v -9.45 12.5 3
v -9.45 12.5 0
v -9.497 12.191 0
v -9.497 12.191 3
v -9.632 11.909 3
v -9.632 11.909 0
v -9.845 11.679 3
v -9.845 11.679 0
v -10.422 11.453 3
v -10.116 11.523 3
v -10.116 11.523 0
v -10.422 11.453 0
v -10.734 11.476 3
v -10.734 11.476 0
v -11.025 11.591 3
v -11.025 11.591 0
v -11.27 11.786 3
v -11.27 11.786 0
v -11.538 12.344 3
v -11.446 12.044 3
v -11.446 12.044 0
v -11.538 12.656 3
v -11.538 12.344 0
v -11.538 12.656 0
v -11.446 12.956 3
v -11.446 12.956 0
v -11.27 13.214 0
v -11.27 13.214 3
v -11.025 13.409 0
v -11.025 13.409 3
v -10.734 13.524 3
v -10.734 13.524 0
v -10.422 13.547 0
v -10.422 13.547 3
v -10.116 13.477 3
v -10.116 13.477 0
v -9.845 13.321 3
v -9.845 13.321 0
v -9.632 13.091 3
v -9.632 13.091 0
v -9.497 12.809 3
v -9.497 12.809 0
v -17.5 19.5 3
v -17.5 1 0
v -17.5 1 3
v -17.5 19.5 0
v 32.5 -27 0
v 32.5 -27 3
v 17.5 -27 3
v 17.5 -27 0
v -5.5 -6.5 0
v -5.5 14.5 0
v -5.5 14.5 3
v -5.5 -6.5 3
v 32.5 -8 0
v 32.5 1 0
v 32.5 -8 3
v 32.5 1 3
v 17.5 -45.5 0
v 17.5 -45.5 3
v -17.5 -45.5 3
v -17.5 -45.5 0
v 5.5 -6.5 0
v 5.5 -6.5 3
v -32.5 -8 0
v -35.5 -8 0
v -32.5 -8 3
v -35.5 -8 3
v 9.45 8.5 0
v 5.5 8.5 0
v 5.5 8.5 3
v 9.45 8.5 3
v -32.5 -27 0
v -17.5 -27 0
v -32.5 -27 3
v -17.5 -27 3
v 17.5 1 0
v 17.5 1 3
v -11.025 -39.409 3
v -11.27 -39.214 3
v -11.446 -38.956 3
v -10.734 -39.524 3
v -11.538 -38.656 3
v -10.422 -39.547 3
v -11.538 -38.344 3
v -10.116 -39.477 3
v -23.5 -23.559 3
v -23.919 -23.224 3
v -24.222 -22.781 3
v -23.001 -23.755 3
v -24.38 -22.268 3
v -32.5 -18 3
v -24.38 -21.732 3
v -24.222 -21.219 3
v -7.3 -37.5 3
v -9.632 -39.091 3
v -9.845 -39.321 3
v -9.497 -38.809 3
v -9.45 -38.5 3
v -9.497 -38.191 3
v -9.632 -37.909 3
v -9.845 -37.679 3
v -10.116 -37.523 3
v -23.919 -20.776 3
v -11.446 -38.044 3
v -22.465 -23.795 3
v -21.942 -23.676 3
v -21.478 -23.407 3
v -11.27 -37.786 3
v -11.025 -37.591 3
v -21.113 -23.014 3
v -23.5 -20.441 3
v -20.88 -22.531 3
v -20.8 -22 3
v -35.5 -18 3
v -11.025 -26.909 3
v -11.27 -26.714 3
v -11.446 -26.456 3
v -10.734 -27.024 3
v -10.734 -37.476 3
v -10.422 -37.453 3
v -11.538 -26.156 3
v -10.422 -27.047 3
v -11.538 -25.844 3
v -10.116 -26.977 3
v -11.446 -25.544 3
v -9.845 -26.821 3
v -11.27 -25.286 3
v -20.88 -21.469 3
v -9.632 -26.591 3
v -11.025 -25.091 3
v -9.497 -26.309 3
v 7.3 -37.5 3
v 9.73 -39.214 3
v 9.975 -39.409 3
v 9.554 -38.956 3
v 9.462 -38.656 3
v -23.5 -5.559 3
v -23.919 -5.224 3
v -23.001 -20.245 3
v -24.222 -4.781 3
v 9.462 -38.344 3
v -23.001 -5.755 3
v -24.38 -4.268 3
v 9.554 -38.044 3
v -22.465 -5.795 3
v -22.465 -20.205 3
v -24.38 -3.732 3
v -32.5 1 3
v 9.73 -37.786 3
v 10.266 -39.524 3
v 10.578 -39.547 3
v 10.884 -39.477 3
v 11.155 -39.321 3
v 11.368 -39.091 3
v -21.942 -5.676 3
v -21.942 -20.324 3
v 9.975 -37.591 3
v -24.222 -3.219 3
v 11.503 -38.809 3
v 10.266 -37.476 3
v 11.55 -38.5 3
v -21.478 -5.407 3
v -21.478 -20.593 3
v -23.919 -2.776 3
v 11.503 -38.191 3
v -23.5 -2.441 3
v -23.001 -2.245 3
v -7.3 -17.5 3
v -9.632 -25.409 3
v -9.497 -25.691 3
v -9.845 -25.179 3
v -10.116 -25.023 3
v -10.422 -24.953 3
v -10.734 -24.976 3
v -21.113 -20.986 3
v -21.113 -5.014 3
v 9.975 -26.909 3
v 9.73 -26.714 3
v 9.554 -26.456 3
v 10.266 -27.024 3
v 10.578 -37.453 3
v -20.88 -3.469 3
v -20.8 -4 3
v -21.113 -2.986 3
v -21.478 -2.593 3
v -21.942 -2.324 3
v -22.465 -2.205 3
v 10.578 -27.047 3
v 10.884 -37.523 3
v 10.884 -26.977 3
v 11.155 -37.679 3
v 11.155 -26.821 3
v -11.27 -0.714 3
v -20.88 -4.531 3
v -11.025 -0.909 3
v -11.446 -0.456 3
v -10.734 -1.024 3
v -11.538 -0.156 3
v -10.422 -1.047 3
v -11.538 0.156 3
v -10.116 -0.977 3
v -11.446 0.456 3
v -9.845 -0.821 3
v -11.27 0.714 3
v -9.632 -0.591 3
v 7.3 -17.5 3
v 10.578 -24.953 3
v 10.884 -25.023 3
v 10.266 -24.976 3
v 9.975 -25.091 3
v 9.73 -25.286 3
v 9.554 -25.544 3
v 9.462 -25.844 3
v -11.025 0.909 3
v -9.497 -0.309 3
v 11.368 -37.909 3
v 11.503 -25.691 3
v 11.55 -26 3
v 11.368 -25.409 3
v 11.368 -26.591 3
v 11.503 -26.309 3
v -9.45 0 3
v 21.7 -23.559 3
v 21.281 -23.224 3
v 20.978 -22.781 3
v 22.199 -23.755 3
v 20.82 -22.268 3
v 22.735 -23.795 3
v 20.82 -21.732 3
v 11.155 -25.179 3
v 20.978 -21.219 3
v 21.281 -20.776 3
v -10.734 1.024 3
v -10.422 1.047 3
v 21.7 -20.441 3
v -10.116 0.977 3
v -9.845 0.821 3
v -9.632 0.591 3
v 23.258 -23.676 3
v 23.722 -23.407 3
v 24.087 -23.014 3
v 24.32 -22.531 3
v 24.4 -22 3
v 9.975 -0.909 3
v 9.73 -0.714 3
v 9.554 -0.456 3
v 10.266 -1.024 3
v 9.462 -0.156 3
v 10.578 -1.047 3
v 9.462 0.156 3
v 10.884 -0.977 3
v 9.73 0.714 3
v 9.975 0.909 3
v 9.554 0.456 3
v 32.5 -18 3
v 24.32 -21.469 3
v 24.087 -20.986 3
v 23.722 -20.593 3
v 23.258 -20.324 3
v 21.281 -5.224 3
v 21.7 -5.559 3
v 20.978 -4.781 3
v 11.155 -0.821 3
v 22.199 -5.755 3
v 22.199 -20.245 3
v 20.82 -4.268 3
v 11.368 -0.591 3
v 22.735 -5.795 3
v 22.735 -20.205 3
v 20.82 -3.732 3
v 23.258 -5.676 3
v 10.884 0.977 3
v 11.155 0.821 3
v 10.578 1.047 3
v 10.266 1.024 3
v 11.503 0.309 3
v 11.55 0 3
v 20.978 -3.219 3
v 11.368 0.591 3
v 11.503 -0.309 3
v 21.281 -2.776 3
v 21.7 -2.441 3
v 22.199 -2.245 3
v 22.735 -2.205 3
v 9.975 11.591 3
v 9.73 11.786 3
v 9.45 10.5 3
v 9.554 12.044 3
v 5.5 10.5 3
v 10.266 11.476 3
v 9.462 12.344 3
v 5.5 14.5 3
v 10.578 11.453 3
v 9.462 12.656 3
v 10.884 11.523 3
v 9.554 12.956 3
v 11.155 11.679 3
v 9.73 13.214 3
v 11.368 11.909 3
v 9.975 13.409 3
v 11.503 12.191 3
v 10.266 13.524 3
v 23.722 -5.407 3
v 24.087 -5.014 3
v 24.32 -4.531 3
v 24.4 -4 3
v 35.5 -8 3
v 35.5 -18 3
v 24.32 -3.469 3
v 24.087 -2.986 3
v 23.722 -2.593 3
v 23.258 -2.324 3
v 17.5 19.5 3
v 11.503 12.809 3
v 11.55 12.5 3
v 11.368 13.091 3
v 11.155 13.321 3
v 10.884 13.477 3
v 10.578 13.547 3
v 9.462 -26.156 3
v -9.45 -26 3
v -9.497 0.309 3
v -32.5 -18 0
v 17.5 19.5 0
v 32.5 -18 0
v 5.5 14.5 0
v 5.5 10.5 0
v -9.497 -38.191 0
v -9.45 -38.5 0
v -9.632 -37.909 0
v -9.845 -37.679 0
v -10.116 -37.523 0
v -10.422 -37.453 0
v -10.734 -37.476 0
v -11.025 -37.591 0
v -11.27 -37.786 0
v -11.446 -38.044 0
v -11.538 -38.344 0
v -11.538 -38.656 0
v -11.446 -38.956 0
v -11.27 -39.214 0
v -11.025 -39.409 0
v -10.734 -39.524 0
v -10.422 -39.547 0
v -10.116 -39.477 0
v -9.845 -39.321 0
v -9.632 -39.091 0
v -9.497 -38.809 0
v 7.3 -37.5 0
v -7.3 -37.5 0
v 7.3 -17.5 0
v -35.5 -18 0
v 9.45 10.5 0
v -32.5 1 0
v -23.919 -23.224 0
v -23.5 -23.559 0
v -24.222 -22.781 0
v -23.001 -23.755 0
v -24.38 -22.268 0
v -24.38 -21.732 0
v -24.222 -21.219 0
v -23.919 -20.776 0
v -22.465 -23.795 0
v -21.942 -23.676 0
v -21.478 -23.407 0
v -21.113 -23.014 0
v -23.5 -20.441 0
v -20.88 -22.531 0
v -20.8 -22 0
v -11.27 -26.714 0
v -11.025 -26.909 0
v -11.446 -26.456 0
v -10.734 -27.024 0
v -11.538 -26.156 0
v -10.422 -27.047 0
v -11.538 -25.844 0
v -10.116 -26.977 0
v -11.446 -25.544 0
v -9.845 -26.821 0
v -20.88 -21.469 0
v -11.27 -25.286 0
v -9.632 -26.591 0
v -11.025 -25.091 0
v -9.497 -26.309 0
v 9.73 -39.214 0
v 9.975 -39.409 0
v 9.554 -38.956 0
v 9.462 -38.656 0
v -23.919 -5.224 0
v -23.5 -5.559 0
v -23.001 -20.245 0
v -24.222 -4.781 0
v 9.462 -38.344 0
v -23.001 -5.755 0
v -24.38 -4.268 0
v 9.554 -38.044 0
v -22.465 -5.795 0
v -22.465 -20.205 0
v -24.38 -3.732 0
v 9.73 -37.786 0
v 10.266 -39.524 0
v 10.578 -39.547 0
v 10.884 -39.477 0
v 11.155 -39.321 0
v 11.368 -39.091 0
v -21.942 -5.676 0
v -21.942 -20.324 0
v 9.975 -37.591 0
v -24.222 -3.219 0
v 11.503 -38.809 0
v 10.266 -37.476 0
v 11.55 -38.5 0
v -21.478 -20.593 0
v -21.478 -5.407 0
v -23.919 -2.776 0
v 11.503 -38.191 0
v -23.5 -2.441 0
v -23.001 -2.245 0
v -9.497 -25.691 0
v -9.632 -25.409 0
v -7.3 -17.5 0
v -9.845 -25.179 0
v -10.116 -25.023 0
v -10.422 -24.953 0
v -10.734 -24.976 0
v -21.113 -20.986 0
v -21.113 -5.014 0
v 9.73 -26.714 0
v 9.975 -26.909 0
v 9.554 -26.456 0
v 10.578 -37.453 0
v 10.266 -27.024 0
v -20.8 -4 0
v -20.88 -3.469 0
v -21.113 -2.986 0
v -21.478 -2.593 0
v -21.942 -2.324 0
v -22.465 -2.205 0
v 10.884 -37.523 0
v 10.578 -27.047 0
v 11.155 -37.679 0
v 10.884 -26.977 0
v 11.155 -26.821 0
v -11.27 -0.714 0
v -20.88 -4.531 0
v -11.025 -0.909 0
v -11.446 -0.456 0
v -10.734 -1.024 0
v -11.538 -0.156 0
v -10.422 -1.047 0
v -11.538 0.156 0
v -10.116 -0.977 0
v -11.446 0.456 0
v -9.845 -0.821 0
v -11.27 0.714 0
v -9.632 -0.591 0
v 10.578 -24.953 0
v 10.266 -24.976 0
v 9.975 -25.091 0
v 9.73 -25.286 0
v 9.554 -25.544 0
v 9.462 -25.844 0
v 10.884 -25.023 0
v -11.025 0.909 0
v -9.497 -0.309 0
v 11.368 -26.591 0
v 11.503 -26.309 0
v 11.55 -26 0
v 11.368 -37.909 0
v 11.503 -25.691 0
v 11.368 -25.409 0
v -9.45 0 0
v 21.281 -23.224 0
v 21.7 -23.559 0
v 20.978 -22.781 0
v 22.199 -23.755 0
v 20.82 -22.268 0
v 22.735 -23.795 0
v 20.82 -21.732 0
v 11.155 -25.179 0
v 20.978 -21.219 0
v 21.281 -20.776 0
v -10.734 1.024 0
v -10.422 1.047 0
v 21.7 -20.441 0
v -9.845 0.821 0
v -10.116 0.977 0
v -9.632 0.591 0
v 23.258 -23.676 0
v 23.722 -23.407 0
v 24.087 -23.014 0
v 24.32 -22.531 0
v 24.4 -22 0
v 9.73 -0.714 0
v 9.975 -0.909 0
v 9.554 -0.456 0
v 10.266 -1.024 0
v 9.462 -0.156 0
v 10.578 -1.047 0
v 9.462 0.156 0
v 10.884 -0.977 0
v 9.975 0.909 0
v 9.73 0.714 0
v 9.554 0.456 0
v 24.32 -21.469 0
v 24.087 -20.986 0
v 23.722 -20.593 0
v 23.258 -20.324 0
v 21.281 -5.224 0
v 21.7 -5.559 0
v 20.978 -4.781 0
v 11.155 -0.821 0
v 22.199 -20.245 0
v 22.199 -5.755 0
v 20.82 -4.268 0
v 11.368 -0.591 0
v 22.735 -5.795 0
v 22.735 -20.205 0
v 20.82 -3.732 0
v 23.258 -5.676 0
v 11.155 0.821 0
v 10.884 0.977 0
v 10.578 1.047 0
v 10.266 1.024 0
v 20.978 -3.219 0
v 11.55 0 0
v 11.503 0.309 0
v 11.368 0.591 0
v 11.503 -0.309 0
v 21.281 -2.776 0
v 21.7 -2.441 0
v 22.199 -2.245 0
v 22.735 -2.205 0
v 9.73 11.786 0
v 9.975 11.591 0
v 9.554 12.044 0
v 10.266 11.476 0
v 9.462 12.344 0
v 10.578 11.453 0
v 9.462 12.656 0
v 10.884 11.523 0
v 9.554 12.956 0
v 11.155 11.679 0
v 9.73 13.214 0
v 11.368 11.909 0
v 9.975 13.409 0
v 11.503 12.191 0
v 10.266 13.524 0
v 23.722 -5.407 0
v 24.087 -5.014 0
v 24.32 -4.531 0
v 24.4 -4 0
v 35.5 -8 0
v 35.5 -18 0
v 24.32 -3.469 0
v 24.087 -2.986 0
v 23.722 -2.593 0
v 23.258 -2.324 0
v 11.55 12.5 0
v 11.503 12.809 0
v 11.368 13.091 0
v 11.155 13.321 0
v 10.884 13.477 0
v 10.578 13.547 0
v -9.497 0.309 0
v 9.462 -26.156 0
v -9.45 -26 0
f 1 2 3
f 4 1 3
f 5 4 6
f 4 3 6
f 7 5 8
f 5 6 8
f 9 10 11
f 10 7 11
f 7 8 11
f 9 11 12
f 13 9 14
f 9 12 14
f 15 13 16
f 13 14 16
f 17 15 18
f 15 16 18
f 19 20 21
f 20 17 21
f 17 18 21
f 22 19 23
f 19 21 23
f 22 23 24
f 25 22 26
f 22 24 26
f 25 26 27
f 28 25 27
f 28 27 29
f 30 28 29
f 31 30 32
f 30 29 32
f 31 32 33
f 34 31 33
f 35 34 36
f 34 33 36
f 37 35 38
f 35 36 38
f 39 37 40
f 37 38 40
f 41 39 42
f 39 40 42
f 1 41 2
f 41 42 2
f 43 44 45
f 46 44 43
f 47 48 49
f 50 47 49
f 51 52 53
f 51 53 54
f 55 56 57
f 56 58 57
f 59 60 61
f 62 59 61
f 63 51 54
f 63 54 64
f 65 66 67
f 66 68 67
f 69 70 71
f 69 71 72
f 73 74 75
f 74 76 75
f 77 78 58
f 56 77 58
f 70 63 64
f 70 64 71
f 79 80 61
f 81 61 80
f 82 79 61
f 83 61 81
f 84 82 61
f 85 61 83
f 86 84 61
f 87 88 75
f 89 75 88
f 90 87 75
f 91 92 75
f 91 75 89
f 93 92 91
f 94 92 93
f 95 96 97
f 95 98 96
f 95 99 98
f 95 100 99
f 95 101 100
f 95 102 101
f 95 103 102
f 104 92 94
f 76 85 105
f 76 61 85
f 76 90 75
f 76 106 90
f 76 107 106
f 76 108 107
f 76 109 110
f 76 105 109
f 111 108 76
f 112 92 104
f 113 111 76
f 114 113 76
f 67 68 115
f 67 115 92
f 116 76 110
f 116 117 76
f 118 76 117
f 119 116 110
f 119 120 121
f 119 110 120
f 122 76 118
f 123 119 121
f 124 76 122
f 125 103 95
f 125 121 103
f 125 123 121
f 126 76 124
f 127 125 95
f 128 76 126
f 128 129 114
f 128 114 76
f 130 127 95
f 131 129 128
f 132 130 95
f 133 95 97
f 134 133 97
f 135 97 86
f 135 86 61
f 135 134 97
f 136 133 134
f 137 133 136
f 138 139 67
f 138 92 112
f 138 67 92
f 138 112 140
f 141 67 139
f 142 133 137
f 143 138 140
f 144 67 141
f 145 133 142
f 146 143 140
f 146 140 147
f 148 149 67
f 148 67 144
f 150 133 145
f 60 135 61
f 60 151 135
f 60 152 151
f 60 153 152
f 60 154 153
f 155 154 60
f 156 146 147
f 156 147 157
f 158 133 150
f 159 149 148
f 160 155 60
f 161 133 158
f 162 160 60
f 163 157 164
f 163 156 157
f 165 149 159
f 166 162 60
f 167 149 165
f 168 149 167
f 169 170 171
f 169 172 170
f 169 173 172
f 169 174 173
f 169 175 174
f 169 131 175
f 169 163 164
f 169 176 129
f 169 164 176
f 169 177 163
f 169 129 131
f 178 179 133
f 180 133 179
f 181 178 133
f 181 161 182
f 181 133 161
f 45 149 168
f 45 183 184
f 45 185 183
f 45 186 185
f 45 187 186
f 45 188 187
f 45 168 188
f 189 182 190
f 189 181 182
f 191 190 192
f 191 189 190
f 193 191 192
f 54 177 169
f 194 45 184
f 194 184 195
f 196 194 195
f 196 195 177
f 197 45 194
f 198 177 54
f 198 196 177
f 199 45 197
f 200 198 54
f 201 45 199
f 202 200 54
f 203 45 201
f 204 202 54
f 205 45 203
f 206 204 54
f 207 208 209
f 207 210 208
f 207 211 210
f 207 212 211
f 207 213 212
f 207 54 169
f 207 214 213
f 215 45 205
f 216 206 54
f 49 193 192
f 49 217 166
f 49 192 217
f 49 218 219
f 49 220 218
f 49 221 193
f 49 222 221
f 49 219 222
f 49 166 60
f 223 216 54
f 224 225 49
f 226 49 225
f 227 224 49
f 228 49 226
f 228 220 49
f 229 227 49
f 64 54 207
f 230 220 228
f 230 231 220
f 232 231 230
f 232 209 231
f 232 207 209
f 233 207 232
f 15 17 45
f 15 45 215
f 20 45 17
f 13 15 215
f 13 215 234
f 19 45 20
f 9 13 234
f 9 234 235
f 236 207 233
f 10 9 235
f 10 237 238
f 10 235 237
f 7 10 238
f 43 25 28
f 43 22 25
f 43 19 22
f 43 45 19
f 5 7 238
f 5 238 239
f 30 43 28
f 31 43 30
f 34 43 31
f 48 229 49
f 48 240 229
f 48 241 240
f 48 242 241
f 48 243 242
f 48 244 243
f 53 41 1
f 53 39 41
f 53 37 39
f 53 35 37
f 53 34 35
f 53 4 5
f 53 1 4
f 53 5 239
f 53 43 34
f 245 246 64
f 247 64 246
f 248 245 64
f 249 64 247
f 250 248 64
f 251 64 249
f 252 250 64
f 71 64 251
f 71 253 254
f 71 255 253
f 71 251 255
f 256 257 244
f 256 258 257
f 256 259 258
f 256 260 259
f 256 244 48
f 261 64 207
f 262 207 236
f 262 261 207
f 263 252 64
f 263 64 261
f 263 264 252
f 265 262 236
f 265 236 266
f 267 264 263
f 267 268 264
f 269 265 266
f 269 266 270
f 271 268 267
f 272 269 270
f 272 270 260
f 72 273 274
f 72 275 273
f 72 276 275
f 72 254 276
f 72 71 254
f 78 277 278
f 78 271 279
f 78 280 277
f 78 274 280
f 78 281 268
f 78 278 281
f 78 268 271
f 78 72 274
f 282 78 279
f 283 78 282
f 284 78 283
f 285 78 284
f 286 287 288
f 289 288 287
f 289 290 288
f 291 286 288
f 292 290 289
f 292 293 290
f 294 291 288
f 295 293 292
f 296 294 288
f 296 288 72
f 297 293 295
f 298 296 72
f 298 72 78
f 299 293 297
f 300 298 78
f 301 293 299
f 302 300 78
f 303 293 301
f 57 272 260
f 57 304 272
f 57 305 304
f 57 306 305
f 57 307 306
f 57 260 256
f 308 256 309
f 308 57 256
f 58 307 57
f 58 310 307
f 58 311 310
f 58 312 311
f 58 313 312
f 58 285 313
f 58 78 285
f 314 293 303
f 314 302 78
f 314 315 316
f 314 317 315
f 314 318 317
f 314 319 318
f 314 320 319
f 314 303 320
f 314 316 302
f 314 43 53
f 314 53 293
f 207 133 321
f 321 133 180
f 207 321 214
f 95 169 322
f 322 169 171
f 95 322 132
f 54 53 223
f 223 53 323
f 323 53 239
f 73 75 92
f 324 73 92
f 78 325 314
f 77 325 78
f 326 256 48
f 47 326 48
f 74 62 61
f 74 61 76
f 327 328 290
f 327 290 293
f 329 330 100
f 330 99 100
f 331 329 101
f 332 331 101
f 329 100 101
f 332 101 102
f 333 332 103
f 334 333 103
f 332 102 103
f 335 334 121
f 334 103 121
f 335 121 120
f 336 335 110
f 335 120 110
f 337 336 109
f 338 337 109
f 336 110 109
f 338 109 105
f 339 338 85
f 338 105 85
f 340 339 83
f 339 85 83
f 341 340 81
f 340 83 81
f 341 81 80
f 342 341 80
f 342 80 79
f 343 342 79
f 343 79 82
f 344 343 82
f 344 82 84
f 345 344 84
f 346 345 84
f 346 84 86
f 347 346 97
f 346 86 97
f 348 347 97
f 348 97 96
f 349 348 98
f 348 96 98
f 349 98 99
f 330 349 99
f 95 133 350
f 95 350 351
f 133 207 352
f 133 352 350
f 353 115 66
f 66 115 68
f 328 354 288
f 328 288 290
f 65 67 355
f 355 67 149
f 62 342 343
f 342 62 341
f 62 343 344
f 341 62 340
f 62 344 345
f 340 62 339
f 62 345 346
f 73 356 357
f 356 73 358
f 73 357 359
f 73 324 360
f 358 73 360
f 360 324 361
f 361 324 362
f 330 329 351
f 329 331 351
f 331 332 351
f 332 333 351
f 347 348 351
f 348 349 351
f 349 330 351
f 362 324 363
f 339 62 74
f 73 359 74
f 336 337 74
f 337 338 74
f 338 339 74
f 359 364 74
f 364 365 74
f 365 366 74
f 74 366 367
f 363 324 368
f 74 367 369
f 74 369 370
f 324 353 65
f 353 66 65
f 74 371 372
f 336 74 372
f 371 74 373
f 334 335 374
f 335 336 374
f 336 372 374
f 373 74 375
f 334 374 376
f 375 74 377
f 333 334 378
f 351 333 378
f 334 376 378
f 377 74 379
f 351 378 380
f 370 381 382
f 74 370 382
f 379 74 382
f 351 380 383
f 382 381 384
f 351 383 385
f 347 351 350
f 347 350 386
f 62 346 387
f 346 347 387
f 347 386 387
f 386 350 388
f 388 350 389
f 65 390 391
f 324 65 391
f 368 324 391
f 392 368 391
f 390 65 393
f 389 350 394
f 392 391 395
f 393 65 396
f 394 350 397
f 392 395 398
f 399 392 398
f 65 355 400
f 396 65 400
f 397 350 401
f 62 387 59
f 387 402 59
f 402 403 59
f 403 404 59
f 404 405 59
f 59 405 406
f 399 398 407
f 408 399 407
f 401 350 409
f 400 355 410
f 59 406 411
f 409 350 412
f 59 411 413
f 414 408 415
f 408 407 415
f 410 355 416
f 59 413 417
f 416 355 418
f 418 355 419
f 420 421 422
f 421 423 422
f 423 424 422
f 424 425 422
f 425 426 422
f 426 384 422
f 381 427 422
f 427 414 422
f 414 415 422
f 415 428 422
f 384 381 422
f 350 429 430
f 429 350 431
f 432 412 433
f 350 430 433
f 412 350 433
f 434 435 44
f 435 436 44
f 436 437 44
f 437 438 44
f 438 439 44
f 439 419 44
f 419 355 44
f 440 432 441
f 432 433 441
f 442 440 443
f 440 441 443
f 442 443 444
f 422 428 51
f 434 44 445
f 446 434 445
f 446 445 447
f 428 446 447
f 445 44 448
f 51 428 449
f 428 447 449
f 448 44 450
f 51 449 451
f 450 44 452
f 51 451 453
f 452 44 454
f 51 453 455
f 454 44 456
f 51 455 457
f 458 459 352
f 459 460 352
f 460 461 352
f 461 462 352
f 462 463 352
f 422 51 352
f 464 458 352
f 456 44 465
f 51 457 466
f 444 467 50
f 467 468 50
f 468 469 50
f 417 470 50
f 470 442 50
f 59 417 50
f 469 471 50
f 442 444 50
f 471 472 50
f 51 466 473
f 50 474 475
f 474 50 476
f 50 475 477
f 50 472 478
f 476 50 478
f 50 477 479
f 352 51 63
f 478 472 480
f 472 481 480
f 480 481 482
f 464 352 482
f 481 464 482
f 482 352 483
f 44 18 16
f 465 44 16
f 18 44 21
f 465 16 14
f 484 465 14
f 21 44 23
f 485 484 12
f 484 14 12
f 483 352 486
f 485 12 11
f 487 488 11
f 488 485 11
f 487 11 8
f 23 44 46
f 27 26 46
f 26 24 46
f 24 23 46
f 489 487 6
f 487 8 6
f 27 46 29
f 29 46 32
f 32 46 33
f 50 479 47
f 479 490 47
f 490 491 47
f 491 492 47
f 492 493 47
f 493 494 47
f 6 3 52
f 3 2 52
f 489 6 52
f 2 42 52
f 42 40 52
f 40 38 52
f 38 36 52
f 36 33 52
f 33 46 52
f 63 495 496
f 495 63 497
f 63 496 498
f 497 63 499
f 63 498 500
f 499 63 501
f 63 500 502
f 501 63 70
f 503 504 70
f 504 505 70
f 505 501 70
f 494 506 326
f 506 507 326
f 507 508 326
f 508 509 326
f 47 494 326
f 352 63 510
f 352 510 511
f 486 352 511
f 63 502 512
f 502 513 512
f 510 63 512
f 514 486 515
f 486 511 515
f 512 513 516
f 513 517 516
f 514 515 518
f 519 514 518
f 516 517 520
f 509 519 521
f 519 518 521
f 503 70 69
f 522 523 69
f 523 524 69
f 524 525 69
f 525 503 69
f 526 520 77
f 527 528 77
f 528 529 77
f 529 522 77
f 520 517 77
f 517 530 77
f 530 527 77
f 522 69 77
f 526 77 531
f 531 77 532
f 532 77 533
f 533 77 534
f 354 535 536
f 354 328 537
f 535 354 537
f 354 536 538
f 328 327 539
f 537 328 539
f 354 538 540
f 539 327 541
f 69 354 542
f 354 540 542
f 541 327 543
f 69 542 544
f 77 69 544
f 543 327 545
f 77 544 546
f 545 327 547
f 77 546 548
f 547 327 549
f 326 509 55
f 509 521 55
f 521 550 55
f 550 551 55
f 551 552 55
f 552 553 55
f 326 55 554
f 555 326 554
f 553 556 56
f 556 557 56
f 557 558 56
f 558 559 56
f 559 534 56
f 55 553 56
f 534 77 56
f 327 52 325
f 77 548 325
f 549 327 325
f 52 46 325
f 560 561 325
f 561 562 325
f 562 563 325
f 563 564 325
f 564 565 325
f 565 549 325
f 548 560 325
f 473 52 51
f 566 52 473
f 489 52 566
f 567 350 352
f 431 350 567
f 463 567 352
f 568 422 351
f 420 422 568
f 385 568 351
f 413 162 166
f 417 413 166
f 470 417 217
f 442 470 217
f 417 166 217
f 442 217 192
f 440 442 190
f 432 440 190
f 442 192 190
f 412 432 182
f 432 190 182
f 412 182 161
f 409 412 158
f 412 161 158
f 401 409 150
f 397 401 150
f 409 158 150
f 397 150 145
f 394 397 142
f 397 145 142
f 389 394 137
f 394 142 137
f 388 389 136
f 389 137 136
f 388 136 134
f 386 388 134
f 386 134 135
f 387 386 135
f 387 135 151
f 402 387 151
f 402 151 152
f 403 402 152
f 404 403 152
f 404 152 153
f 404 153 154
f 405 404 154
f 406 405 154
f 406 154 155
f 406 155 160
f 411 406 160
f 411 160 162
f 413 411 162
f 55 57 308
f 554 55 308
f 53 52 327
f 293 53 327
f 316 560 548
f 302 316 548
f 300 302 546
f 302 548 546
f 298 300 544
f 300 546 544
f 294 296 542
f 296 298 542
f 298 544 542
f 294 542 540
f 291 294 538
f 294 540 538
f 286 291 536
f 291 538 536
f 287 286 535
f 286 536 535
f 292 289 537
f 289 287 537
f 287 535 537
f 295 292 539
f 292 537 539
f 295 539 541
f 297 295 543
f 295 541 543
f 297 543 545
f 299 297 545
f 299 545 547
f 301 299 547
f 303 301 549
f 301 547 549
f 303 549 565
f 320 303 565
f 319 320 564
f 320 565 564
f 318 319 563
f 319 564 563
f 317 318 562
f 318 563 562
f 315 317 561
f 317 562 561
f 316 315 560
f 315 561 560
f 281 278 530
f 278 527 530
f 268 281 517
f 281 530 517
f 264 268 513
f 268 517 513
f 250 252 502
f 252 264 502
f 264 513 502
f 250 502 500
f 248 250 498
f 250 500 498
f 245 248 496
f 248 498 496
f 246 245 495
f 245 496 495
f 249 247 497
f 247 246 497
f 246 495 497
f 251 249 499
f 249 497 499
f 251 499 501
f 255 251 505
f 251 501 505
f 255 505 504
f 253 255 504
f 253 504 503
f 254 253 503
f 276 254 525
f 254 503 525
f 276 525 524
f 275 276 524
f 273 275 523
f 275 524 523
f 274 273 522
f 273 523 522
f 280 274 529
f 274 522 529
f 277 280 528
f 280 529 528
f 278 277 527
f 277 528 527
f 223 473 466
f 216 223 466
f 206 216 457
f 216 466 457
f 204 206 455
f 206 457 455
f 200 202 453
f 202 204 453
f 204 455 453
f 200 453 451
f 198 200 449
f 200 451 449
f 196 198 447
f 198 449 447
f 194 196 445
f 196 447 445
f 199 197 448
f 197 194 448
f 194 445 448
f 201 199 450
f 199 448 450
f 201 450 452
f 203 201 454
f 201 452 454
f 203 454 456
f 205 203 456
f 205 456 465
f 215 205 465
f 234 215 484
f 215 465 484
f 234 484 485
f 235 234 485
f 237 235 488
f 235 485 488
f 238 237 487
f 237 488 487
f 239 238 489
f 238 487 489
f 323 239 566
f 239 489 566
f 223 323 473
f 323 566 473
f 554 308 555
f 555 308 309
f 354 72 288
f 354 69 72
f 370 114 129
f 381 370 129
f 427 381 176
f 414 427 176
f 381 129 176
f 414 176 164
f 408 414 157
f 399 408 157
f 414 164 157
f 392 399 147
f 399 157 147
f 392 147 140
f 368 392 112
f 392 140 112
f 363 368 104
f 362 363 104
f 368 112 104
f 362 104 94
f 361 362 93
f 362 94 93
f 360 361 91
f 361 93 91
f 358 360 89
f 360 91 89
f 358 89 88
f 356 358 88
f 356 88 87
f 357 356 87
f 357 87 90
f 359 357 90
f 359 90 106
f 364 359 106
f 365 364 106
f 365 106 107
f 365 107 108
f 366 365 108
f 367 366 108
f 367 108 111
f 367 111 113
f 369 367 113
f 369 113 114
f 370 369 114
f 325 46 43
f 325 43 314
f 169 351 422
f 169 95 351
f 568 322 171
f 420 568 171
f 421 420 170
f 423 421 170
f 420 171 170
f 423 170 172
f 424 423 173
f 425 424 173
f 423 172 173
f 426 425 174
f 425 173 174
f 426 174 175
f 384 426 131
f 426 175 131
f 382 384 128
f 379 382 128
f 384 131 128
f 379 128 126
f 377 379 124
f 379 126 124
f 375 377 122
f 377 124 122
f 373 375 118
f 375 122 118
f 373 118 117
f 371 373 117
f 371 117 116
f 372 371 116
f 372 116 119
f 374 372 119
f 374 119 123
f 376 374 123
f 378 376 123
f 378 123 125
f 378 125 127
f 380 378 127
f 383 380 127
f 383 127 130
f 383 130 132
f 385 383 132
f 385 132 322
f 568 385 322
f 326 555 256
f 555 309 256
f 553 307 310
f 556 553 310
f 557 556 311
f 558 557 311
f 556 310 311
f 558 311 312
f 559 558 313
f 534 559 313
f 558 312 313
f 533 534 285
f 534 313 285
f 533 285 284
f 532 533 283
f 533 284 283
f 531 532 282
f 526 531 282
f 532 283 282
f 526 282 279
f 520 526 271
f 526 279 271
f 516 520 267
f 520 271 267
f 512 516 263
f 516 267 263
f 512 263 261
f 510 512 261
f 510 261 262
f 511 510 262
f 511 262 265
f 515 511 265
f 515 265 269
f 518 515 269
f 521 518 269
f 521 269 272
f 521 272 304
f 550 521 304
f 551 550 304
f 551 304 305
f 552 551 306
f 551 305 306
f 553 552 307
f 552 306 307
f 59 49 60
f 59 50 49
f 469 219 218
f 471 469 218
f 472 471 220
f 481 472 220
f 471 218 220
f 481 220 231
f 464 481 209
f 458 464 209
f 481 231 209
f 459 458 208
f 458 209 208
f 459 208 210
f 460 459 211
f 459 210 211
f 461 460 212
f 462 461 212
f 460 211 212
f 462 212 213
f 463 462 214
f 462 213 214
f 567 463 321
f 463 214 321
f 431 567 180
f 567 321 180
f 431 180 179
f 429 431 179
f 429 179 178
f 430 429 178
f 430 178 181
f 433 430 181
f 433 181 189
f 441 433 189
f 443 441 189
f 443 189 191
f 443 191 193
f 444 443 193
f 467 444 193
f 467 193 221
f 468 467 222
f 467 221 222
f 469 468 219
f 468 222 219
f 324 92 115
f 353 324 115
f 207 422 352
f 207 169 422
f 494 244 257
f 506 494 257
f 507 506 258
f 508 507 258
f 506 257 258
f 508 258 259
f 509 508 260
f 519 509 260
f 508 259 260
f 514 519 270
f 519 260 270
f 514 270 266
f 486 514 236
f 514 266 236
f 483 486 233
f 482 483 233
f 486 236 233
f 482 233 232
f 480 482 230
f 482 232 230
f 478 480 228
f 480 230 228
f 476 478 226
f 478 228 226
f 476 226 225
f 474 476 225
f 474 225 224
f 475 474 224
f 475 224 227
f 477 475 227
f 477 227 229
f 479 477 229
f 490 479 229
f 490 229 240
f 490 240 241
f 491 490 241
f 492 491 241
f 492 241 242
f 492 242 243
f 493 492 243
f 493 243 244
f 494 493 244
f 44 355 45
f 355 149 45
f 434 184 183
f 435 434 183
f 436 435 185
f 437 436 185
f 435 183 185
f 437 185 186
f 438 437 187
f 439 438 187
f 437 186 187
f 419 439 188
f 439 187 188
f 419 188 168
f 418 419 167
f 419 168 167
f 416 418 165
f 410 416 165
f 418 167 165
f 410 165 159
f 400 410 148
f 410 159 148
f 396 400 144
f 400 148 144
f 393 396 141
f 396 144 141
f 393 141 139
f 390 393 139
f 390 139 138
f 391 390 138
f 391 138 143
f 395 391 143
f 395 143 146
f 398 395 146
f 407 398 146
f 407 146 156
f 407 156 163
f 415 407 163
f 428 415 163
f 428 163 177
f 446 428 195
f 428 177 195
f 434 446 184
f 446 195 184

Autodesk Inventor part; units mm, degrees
ref_plane "YZ Plane" through (0, 0, 0) normal (1, 0, 0) x (0, 1, 0)
ref_plane "XZ Plane" through (0, 0, 0) normal (0, 1, 0) x (-1, 0, 0)
ref_plane "XY Plane" through (0, 0, 0) normal (0, 0, 1) x (1, 0, 0)
sketch "Sketch1" plane through (0, 0, 0) normal (0, 0, 1) x (1, 0, 0)
  line L0 (-17.5, 19.5) -> (17.5, 19.5)
  line L1 (17.5, 19.5) -> (17.5, -14.5)
  line L2 (17.5, -14.5) -> (-17.5, -14.5)
  line L3 (-17.5, -14.5) -> (-17.5, 19.5)
  line L4 (-12.5, 14.5) -> (-12.5, -9.5) construction
  line L5 (12.5, 14.5) -> (-12.5, 14.5) construction
  line L6 (12.5, -9.5) -> (12.5, 14.5) construction
  line L7 (-12.5, -9.5) -> (12.5, -9.5) construction
  line L8 (8.7, 9.1) -> (8.7, 9.9) construction
  line L9 (8.7, 9.9) -> (7.48, 9.9) construction
  line L10 (7.48, 9.9) -> (7.48, 9.1) construction
  line L11 (7.48, 9.1) -> (8.7, 9.1) construction
  circle A0 centre (-10.5, 12.5) radius 1.05 projected
  circle A1 centre (-10.5, 0) radius 1.05 projected
  circle A2 centre (10.5, 12.5) radius 1.05 projected
  circle A3 centre (10.5, 0) radius 1.05 projected
  line L12 (-5.5, 14.5) -> (-5.5, -6.5)
  line L13 (-5.5, -6.5) -> (5.5, -6.5)
  line L14 (5.5, -6.5) -> (5.5, 8.5)
  line L15 (5.5, 8.5) -> (9.45, 8.5)
  line L16 (9.45, 8.5) -> (9.45, 10.5)
  line L17 (9.45, 10.5) -> (5.5, 10.5)
  line L18 (5.5, 10.5) -> (5.5, 14.5)
  line L19 (-5.5, 14.5) -> (5.5, 14.5)
  point P0 (0, 0)
  dimension "d0" = 5
  dimension "d1" = 5
  dimension "d2" = 35
  dimension "d3" = 5
  dimension "d4" = 5
  dimension "d5" = 7
  dimension "d6" = 7
  dimension "d7" = 3
  dimension "d8" = 18
  dimension "d9" = 3.05
  dimension "d10" = 4
extrude "Extrusion1" add sketch "Sketch1" along normal blind 3
sketch "Sketch2" plane through (0, 0, 3) normal (0, 0, 1) x (1, 0, 0)
  line L0 (-17.5, -14.5) -> (17.5, -14.5) construction
  line L1 (-17.5, 19.5) -> (-17.5, -14.5) construction
  line L2 (17.5, -14.5) -> (17.5, 19.5) construction
  line L3 (-17.5, -14.5) -> (17.5, -14.5)
  line L4 (17.5, -14.5) -> (17.5, -45.5)
  line L5 (17.5, -45.5) -> (-17.5, -45.5)
  line L6 (-17.5, -45.5) -> (-17.5, -14.5)
  line L7 (-12.5, -16.5) -> (-12.5, -40.5) construction
  line L8 (12.5, -40.5) -> (12.5, -16.5) construction
  line L9 (12.5, -16.5) -> (-12.5, -16.5) construction
  line L10 (-12.5, -40.5) -> (12.5, -40.5) construction
  line L11 (-7.3, -17.5) -> (7.3, -17.5)
  line L12 (7.3, -17.5) -> (7.3, -37.5)
  line L13 (7.3, -37.5) -> (-7.3, -37.5)
  line L14 (-7.3, -37.5) -> (-7.3, -17.5)
  circle A0 centre (-10.5, -26) radius 1.05 projected
  circle A1 centre (-10.5, -38.5) radius 1.05 projected
  circle A2 centre (10.5, -26) radius 1.05 projected
  circle A3 centre (10.5, -38.5) radius 1.05 projected
  point P0 (0, 0)
  dimension "d13" = 5
  dimension "d14" = 1
  dimension "d15" = 5.2
  dimension "d16" = 5.2
  dimension "d17" = 3
extrude "Extrusion2" add sketch "Sketch2" against normal blind 3
sketch "Sketch3" plane through (0, 0, 3) normal (0, 0, 1) x (1, 0, 0)
  line L0 (17.5, 19.5) -> (17.5, -45.5) projected
  line L1 (-17.5, 19.5) -> (-17.5, -45.5) projected
  line L2 (-17.5, -45.5) -> (-17.5, 19.5) construction
  line L3 (-17.5, -13) -> (17.5, -13) construction
  line L4 (17.5, 19.5) -> (17.5, -45.5) construction
  line L5 (17.5, 1) -> (32.5, 1)
  line L6 (32.5, 1) -> (32.5, -27)
  line L7 (32.5, -27) -> (17.5, -27)
  line L8 (17.5, -27) -> (17.5, 1)
  line L9 (32.5, -8) -> (35.5, -8)
  line L10 (35.5, -8) -> (35.5, -18)
  line L11 (35.5, -18) -> (32.5, -18)
  line L12 (32.5, -18) -> (32.5, -8)
  line L13 (17.5, -13) -> (35.5, -13) construction
  point P0 (0, 0)
  dimension "d20" = 15
  dimension "d21" = 14
  dimension "d22" = 14
  dimension "d23" = 3
  dimension "d24" = 5
  dimension "d25" = 5
extrude "Extrusion3" add sketch "Sketch3" against normal blind 3
ref_plane "Work Plane1" through (0, 19.5, 3) normal (1, 0, 0) x (0, 0, -1)
mirror "Mirror1" about plane through (0, 19.5, 3) normal (1, 0, 0) of "Extrusion3"
sketch "Sketch4" plane through (0, 0, 3) normal (0, 0, 1) x (1, 0, 0)
  circle A0 centre (22.6, -4) radius 1.8 projected
  circle A1 centre (22.6, -22) radius 1.8 projected
  circle A2 centre (-22.6, -22) radius 1.8 projected
  circle A3 centre (-22.6, -4) radius 1.8 projected
  point P0 (0, 0)
extrude "Extrusion4" cut sketch "Sketch4" against normal blind 14.1125
properties part number "Camera holder plate"
